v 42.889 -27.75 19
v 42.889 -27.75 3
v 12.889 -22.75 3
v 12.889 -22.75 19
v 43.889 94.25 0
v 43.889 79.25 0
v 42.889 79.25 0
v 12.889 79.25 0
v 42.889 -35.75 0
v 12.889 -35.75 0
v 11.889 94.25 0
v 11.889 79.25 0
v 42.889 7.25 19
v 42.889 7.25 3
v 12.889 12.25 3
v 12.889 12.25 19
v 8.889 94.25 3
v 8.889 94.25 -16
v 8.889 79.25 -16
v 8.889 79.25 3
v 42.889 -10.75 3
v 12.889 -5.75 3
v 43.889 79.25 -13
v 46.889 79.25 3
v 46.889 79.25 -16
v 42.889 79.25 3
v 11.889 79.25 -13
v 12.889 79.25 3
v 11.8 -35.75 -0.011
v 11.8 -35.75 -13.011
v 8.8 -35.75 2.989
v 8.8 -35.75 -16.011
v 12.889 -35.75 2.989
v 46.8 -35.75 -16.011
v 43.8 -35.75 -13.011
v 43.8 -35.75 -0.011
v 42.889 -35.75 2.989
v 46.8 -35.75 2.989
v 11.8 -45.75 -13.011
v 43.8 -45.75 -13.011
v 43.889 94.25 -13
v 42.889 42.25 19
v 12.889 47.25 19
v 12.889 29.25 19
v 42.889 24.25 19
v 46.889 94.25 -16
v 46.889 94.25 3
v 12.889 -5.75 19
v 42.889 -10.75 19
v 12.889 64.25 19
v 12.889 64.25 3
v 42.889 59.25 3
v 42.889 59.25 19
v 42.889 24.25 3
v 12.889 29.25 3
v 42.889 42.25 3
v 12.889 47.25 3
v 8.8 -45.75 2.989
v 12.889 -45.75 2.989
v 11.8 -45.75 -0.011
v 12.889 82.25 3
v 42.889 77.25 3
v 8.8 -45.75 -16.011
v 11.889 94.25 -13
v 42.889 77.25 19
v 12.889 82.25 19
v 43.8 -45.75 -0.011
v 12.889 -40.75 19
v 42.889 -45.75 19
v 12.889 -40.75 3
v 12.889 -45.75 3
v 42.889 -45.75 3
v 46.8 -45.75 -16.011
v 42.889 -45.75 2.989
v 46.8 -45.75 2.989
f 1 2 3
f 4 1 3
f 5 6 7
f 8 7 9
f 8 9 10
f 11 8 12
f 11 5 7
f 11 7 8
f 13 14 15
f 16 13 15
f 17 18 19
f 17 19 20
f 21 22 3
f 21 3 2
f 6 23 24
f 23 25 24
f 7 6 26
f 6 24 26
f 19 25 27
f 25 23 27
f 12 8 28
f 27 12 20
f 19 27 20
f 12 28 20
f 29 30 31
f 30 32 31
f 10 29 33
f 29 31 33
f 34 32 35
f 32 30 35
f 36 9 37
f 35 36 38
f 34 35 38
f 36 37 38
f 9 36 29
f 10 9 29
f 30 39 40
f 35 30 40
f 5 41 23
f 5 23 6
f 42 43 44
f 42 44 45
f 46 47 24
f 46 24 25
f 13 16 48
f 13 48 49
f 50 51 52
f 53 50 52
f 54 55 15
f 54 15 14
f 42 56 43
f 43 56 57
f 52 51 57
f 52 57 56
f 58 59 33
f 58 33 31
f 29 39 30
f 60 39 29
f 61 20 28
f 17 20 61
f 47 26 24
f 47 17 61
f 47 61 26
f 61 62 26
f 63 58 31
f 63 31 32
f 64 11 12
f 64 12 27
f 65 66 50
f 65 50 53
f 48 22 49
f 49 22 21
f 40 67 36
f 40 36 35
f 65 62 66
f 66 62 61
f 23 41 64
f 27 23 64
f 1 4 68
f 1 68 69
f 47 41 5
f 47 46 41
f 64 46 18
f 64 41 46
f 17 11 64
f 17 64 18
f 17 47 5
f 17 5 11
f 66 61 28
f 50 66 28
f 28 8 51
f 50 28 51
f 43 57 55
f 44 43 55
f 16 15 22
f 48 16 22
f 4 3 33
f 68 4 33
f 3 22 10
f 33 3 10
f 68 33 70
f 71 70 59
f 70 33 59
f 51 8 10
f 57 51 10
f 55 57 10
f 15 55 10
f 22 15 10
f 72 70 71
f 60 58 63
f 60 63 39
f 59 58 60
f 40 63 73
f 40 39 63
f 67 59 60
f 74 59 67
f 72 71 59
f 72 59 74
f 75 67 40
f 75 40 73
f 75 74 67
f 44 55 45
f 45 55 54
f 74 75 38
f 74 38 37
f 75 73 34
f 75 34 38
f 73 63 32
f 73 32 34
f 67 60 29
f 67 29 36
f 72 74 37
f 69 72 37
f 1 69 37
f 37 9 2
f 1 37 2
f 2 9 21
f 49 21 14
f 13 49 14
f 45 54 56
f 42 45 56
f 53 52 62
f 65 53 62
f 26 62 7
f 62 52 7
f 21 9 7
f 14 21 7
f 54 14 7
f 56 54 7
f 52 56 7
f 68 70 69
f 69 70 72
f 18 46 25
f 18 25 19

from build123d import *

# Parameters (mm, degrees)
F0_W     = 30
F0_H     = 140
F1_DEPTH = 3
F3_DEPTH = 16
F4_W     = 3
F4_H     = 3
F4_W_2   = 1
F4_W_3   = 30
F4_W_4   = 32
F5_DEPTH = 15
F6_W     = 3
F6_H     = 3
F6_W_2   = 32
F7_DEPTH = 10


with BuildPart() as f1:
    # F0 (on Top) → F1 (new body)
    with BuildSketch(Plane.XY):
        with Locations((27.8885364532, 24.2495501014)):
            Rectangle(F0_W, F0_H)
    extrude(amount=F1_DEPTH)

    # F2 (on face) → F3 (join)
    with BuildSketch(Plane.XY.offset(3)):
        Polygon((42.8885364532, -27.7504498986), (12.8885364532, -22.7504498986), (12.8885364532, -40.7504498986), (42.8885364532, -45.7504498986), align=None)
        Polygon((12.8885364532, 12.2495501014), (12.8885364532, -5.7504498986), (42.8885364532, -10.7504498986), (42.8885364532, 7.2495501014), align=None)
        Polygon((12.8885364532, 47.2495501014), (12.8885364532, 29.2495501014), (42.8885364532, 24.2495501014), (42.8885364532, 42.2495501014), align=None)
        Polygon((12.8885364532, 82.2495501014), (12.8885364532, 64.2495501014), (42.8885364532, 59.2495501014), (42.8885364532, 77.2495501014), align=None)
    extrude(amount=F3_DEPTH)

    # F4 (on face) → F5 (join)
    with BuildSketch(Plane(origin=(0, 94.2495501014, 0), x_dir=(-1, 0, 0), z_dir=(0, 1, 0))):
        with Locations((-45.3885364532, 1.5)):
            Rectangle(F4_W, F4_H)
        with Locations((-43.3885364532, 1.5)):
            Rectangle(F4_W_2, F4_H)
        Polygon((-43.8885364532, 0), (-46.8885364532, 0), (-46.8885364532, -16), (-43.8885364532, -16), (-43.8885364532, -13), align=None)
        with Locations((-27.8885364532, 1.5)):
            Rectangle(F4_W_3, F4_H)
        with Locations((-27.8885364532, -14.5)):
            Rectangle(F4_W_4, F4_H)
        with Locations((-12.3885364532, 1.5)):
            Rectangle(F4_W_2, F4_H)
        Polygon((-11.8885364532, 0), (-11.8885364532, -13), (-11.8885364532, -16), (-8.8885364532, -16), (-8.8885364532, 0), align=None)
        with Locations((-10.3885364532, 1.5)):
            Rectangle(F4_W, F4_H)
    extrude(amount=-F5_DEPTH)

    # F6 (on face) → F7 (join)
    with BuildSketch(Plane.XZ.offset(45.7504498986)):
        with Locations((10.2999972403, 1.4885346591)):
            Rectangle(F6_W, F6_H)
        Polygon((11.7999972403, -0.0114653409), (8.7999972403, -0.0114653409), (8.7999972403, -16.0114653409), (11.7999972403, -16.0114653409), (11.7999972403, -13.0114653409), align=None)
        with Locations((27.7999972403, -14.5114653409)):
            Rectangle(F6_W_2, F6_H)
        Polygon((46.7999972403, -0.0114653409), (43.7999972403, -0.0114653409), (43.7999972403, -13.0114653409), (43.7999972403, -16.0114653409), (46.7999972403, -16.0114653409), align=None)
        with Locations((45.2999972403, 1.4885346591)):
            Rectangle(F6_W, F6_H)
        Polygon((12.8885364532, 2.9885346591), (11.7999972403, 2.9885346591), (11.7999972403, -0.0114653409), (43.7999972403, -0.0114653409), (43.7999972403, 2.9885346591), (42.8885364532, 2.9885346591), (42.8885364532, 0), (12.8885364532, 0), align=None)
    extrude(amount=-F7_DEPTH)


solid = f1.part
